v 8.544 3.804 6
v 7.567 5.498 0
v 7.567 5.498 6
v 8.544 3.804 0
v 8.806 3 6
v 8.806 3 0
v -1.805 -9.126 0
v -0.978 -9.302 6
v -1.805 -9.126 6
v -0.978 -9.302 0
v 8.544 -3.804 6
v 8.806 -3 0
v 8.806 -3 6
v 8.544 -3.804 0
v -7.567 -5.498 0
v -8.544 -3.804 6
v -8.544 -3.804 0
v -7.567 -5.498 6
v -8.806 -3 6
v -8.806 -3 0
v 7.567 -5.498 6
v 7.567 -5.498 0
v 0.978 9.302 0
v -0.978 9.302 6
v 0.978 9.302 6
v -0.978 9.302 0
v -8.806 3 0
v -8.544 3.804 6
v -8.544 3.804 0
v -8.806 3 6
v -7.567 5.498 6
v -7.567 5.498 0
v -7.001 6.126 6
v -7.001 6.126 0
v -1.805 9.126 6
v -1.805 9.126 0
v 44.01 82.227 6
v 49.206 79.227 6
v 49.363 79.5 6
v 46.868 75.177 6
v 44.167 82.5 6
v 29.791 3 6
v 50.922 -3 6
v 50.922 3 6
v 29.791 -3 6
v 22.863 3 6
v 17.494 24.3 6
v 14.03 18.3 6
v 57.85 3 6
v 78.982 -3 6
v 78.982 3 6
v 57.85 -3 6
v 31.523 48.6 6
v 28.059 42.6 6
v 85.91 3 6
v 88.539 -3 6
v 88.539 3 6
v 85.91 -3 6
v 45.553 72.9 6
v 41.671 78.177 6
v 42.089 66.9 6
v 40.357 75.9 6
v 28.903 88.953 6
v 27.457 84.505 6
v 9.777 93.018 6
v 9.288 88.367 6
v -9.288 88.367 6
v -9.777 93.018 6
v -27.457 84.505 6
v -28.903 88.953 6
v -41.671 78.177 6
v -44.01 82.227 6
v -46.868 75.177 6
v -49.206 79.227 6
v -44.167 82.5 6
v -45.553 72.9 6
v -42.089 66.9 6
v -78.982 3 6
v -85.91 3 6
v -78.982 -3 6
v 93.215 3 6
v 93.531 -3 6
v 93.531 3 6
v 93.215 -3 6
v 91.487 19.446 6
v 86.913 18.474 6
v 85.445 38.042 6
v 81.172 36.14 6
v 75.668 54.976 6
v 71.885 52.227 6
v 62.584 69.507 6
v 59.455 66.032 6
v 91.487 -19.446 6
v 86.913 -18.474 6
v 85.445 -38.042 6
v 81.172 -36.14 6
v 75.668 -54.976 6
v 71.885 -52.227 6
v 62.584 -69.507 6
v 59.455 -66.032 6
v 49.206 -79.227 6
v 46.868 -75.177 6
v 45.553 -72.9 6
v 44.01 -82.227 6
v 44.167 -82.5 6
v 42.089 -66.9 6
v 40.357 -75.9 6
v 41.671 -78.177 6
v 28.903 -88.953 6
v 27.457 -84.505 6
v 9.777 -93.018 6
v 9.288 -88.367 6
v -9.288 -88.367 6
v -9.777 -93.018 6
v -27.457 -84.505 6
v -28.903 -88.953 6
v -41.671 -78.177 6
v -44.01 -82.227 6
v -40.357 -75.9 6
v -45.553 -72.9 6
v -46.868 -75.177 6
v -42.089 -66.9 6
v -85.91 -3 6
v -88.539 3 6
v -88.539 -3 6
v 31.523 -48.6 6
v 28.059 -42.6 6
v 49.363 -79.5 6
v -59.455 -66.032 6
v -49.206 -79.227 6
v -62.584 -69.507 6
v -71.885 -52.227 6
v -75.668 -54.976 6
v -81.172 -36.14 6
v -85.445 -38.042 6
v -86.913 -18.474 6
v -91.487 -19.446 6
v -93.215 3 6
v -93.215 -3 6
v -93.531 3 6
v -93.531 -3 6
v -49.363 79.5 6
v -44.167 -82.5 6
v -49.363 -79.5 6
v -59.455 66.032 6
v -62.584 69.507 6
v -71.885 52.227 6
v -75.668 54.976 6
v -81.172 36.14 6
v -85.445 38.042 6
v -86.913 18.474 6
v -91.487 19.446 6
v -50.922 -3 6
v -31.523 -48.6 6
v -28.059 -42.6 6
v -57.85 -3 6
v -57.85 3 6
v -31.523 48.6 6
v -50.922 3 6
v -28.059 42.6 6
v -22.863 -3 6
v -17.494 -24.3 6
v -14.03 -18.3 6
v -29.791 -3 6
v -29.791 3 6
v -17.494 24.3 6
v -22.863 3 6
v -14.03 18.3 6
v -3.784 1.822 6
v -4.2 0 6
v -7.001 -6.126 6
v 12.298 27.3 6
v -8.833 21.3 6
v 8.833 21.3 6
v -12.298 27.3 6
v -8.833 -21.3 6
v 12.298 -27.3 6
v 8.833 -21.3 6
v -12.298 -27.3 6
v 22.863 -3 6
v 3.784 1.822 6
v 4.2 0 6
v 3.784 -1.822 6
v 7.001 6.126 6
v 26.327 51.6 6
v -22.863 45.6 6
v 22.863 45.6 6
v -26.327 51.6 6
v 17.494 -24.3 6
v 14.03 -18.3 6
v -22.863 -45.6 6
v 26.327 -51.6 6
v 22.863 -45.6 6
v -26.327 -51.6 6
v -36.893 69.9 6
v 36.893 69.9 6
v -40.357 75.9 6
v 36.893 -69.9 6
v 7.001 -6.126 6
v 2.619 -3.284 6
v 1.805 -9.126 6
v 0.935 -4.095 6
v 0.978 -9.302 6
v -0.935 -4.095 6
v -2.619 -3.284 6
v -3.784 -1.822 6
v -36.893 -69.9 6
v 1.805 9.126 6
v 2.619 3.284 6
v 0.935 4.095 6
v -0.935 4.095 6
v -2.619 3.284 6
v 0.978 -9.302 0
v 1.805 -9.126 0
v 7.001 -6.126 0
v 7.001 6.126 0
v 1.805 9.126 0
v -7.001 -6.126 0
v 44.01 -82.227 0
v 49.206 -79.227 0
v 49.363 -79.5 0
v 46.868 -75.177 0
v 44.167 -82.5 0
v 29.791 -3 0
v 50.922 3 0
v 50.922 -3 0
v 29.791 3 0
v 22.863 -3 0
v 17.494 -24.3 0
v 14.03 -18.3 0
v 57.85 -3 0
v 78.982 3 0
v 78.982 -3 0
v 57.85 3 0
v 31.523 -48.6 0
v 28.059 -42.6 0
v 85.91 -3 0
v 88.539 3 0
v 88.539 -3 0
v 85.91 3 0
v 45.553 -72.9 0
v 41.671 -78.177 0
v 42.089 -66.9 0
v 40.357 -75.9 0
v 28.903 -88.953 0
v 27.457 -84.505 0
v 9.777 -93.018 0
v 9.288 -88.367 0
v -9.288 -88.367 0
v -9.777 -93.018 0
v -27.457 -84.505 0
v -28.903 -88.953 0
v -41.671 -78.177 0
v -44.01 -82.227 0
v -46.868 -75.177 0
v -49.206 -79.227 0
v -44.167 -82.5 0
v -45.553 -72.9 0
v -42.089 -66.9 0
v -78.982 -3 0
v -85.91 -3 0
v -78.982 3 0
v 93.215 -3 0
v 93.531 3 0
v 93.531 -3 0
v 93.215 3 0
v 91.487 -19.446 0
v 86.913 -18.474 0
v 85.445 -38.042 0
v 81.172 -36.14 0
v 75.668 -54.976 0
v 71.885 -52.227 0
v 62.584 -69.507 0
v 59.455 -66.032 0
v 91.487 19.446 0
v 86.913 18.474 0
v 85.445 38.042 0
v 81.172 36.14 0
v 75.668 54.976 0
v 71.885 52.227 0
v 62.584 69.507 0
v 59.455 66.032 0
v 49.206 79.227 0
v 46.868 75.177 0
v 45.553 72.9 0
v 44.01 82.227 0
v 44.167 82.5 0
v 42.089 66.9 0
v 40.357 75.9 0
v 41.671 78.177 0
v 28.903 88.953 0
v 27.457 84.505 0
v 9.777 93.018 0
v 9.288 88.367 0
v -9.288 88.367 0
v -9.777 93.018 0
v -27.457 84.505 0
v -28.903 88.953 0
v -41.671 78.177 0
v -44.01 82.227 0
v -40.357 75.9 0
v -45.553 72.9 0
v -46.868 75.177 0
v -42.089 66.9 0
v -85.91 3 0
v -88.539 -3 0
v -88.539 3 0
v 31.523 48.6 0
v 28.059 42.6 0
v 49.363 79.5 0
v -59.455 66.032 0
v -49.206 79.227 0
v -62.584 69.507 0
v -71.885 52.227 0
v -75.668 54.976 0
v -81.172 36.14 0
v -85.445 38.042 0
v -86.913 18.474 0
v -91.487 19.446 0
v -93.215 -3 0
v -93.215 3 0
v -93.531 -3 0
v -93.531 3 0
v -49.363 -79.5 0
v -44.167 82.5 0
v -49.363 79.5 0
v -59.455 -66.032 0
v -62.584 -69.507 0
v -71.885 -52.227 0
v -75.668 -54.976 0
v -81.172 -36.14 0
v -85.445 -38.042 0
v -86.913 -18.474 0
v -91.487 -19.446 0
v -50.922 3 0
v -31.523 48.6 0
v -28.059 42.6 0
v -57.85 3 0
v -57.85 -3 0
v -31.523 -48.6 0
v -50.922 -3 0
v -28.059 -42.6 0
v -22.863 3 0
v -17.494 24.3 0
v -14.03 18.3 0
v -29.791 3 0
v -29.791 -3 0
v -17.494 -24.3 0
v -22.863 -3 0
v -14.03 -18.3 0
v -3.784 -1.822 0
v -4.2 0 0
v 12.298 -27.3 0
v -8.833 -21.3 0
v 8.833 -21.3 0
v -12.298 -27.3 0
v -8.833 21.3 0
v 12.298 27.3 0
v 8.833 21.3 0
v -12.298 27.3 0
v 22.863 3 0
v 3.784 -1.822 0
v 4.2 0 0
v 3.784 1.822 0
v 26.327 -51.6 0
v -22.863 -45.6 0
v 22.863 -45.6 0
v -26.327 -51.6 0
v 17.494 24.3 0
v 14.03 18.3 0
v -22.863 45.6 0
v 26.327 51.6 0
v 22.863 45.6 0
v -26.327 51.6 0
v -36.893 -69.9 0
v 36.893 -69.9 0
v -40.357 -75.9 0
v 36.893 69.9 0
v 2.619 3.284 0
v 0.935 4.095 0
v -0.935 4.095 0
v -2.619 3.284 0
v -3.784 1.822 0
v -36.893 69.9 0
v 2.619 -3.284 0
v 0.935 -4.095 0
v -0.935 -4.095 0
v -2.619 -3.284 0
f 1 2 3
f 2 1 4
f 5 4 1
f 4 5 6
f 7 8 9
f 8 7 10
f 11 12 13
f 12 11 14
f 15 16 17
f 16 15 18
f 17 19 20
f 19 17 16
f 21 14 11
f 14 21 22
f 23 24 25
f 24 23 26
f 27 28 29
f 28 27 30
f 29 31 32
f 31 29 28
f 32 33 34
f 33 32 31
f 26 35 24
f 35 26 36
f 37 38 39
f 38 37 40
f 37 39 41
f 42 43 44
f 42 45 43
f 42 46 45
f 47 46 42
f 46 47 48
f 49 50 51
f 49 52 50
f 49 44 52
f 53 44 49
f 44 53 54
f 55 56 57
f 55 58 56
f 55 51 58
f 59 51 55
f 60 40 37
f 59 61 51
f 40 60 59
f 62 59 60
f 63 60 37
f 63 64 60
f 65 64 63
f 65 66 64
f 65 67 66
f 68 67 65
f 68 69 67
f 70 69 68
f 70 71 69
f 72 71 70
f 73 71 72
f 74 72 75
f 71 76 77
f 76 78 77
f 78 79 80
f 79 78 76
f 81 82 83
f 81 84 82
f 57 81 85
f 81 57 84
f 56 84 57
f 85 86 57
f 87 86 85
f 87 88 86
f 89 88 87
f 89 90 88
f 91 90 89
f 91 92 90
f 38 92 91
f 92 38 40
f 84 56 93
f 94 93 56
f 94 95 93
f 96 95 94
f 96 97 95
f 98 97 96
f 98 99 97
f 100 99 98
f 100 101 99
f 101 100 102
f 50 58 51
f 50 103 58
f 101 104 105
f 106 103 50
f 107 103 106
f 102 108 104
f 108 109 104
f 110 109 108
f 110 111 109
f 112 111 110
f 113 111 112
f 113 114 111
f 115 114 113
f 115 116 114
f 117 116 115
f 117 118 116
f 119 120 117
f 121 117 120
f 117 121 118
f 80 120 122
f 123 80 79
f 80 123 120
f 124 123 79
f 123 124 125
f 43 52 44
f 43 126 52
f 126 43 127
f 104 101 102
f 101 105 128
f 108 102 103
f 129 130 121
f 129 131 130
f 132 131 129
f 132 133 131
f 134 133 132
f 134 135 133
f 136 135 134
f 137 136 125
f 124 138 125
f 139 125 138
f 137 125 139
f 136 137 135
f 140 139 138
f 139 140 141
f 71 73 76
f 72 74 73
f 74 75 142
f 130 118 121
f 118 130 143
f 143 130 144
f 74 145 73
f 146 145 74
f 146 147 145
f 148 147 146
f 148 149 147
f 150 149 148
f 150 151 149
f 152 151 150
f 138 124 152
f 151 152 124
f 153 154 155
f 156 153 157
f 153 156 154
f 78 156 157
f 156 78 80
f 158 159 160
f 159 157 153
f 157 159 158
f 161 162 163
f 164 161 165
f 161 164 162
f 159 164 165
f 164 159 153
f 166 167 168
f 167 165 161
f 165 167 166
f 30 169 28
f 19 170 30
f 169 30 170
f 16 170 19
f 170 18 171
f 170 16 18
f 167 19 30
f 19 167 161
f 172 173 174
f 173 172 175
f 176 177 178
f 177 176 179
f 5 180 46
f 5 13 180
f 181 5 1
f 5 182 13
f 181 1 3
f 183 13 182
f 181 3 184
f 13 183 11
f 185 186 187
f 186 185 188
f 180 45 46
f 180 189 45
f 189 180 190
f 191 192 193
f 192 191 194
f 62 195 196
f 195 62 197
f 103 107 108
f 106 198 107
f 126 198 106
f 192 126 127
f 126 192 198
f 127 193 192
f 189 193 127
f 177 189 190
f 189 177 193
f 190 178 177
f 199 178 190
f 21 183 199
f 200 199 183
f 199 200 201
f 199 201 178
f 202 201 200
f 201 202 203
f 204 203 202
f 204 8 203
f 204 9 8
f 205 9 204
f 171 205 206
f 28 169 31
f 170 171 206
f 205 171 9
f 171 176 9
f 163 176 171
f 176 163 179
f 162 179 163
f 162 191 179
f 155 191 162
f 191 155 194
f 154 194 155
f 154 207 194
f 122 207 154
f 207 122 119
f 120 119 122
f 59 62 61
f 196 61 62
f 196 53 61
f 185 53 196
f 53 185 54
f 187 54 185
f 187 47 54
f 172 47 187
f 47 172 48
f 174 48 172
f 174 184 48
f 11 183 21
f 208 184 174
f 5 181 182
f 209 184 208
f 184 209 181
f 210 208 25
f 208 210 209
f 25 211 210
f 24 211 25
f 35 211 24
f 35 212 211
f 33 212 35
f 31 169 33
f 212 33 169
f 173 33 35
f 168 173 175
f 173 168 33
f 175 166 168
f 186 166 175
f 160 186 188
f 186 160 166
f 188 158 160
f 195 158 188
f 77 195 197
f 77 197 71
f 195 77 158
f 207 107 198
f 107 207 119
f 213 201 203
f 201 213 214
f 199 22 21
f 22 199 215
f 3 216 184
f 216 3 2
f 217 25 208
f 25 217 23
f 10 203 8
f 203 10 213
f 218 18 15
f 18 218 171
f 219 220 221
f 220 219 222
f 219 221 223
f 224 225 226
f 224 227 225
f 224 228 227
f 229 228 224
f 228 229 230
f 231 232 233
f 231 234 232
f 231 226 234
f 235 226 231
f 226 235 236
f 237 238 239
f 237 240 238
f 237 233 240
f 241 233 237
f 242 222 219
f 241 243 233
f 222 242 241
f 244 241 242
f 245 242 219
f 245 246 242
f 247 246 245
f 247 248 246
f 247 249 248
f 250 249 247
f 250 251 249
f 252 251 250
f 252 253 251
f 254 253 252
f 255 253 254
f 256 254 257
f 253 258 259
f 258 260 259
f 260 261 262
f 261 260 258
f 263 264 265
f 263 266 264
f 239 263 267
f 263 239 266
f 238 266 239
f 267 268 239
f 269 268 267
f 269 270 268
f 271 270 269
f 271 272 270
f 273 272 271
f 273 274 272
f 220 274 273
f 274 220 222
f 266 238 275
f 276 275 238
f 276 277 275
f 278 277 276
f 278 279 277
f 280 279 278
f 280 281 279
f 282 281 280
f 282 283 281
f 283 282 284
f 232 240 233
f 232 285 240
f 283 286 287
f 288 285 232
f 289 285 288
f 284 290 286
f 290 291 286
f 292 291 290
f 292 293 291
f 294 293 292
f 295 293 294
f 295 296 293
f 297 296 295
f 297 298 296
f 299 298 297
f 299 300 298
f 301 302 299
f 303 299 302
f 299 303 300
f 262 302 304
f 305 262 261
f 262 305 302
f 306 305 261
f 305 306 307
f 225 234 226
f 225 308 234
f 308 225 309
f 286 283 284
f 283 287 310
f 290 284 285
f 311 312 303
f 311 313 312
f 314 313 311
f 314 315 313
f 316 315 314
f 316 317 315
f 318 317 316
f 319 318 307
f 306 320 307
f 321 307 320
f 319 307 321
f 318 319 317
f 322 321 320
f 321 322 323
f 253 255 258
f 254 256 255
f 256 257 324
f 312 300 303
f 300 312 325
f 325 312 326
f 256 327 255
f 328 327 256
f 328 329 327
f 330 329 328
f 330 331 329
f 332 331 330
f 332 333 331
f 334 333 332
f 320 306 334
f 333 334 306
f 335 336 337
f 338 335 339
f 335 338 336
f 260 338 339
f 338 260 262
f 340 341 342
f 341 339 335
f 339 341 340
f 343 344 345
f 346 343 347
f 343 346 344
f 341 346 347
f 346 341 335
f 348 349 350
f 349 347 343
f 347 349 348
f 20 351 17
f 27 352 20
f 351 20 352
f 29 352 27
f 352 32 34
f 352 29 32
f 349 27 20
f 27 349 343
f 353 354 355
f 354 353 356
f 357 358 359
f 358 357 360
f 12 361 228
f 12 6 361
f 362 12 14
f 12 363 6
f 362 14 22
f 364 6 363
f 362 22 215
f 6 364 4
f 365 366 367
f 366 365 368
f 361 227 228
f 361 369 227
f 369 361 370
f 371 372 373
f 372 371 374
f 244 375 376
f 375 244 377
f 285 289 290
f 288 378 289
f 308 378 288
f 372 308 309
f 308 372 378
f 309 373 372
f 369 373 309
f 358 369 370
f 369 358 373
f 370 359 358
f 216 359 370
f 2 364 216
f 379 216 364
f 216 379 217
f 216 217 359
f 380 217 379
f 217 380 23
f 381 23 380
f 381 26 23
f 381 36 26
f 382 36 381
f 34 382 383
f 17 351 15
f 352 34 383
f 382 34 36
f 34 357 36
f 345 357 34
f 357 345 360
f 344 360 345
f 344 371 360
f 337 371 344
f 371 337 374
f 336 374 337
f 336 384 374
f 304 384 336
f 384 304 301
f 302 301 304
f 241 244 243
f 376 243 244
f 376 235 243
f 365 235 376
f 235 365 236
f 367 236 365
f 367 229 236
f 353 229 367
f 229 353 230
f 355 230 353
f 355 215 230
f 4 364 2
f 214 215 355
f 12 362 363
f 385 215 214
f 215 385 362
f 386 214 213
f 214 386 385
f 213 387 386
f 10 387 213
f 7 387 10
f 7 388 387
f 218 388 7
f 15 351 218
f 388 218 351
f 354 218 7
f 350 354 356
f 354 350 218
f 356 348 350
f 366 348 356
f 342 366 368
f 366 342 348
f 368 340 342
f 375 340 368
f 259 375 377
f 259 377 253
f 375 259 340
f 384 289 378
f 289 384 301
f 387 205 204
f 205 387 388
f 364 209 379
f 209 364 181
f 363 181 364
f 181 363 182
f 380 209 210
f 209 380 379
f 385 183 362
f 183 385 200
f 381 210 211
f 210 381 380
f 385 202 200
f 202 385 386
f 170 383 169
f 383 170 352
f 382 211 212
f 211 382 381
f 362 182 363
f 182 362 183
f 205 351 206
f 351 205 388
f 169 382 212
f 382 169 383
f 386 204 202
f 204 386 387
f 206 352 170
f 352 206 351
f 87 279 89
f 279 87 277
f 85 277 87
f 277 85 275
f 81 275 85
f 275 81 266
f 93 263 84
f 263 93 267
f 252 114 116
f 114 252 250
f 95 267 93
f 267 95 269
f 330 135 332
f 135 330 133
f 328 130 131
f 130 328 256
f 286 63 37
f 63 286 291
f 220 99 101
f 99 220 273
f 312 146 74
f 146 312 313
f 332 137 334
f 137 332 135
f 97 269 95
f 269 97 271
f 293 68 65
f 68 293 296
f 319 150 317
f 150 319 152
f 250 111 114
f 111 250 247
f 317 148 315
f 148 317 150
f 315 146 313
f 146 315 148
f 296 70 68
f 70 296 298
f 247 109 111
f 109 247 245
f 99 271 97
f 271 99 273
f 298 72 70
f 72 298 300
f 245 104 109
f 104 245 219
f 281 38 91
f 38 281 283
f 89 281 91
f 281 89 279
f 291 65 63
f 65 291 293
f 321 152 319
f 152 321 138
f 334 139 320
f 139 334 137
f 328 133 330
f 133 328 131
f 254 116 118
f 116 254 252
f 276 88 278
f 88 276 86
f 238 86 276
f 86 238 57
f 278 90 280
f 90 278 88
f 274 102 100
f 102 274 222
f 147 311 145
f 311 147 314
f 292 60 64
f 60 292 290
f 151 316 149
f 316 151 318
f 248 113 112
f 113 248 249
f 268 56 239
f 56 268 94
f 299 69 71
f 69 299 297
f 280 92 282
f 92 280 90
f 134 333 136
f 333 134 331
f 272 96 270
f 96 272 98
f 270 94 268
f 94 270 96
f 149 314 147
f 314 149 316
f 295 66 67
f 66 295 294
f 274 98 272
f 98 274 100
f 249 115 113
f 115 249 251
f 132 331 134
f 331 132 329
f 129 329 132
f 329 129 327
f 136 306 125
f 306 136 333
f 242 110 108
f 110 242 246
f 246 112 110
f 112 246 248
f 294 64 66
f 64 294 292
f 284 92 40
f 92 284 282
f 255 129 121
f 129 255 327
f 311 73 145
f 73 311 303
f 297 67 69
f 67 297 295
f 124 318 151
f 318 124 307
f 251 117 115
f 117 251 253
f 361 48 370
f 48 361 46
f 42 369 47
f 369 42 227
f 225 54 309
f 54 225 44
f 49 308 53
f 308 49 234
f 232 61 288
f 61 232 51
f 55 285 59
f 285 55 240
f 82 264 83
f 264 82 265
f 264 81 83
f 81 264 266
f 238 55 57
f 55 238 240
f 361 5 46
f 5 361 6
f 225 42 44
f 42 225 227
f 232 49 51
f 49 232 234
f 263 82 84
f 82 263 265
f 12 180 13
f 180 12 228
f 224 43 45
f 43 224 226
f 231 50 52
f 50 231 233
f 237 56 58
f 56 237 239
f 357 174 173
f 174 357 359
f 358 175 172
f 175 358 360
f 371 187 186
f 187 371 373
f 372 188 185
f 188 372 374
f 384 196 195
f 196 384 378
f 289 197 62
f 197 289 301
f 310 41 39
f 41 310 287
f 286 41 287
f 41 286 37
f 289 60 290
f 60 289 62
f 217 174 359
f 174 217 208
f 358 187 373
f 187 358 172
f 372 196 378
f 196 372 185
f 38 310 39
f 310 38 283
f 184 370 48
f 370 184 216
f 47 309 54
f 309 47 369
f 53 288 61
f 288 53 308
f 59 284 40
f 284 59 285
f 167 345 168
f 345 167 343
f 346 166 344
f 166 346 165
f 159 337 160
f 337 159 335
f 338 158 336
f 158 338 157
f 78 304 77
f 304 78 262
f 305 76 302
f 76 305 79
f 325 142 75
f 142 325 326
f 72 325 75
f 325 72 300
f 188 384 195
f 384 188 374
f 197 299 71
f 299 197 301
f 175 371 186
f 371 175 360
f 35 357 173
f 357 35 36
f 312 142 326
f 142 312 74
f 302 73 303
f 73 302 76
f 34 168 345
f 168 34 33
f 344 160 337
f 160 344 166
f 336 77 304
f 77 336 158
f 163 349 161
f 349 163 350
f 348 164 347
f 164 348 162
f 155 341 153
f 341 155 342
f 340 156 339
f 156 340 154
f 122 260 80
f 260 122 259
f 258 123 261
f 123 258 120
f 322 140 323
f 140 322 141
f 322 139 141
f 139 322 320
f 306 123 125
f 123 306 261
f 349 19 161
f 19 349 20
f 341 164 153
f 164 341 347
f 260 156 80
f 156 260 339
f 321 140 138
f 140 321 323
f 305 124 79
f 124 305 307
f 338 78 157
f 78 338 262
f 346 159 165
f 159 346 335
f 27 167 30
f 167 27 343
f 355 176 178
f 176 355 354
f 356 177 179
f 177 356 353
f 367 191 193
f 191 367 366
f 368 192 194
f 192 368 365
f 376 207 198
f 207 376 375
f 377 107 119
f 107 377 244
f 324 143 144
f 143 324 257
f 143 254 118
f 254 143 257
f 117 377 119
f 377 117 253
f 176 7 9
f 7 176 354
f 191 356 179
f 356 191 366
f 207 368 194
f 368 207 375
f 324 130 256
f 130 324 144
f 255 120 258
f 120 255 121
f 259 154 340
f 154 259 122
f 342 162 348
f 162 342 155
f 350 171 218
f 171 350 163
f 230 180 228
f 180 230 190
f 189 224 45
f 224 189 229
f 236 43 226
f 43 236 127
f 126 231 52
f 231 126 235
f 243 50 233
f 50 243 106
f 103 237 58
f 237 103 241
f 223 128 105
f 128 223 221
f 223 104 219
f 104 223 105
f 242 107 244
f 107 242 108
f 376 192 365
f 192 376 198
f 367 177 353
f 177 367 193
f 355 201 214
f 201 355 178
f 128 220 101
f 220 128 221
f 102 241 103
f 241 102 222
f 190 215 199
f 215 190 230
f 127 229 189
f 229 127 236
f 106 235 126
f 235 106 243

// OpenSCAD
// file: carousel-commons.scad
module square_prism(size, p0, p1) {
    dir = p1 - p0;
    h = norm(dir);
    if (dir[0] == 0 && dir[1] == 0) {
        // no transformation necessary
        translate(p0)
        translate([0, 0, h/2])
        cube([size, size, h], center = true);
    }
    else {
        w  = dir / h;
        u0 = cross(w, [0,0,1]);
        u  = u0 / norm(u0);
        v0 = cross(w, u);
        v  = v0 / norm(v0);
        multmatrix(m=[[u[0], v[0], w[0], p0.x],
                      [u[1], v[1], w[1], p0.y],
                      [u[2], v[2], w[2], p0.z],
                      [0,    0,    0,    1]])
        translate([0, 0, h/2])
        cube([size, size, h], center = true);
    }
}

module point_plate(thickness, points) {
    hull() {
        for (i = [0 : len(points)-1]){
            translate(points[i])
            sphere(d = thickness);
        }
    }
}
// file: carousel-config.scad
// ----------------------------------------------------------------------------
// Configuration of the carousel and its components.
//
// All the values beyod "---- derived" string in each of the sections should
// not be modified manually, as they are derived from the previously defined
// parameters in some way...
// ----------------------------------------------------------------------------

// Generic parameters to address consistency & interconnections of parts.
CYL_FN = 32; // BEWARE!!! set to +- 256 for STL export!
BLEED = 0.5; // overlap for union & difference operations
EASE = 0.2; // socket/pin ease for interconnecting of parts & holes

// Core defining shape of our carousel is N-faced cylinder.
// This affects most of the subsequent parameter definitions & usage.
CAROUSEL_FACE_COUNT = 6;
CAROUSEL_ESCRIBED_RADIUS = 120;
// ---- derived
CAROUSEL_INSCRIBED_RADIUS = CAROUSEL_ESCRIBED_RADIUS * cos(180/CAROUSEL_FACE_COUNT);

// Base of the carousel -> stand that holds the axle, walls, etc.
BASE_TOTAL_HEIGHT = 24;
BASE_FLOOR_THICKNESS = 4;
BASE_WALL_THICKNESS = 4;

// Face, or, a wall of the carousel "shell".
FACE_HEIGHT = 150;
FACE_THICKNESS = 5;
// ---- derived
FACE_WIDTH = CAROUSEL_ESCRIBED_RADIUS * 2 * sin(180/CAROUSEL_FACE_COUNT);
FACE_ANGLE = (1 - 2/CAROUSEL_FACE_COUNT)*180;
FACE_APOTHEM_LEN = FACE_WIDTH / (2 * tan(180/CAROUSEL_FACE_COUNT));
FACE_DOOR_HEIGHT = 0.66 * FACE_HEIGHT;
FACE_DOOR_WIDTH = 0.75 * FACE_WIDTH;

// Roof of the carousel.
ROOF_THICKNESS = 2;
ROOF_HEIGHT = 1.3 * FACE_HEIGHT;

// Ball bearing - real-life dimensions of ball bearing used to "power" the axle.
BEARING_OUTER_D = 22;
BEARING_INNER_D = 8;
BEARING_HEIGHT = 7;
BEARING_SHELL_THICKNESS = 2;

// Axle rotating inside carousel.
AXLE_RADIUS = 4;

// Rotating rig carrying the seats.
RIG_HEIGHT = 6;
RIG_STR = 6;

// Abstract "rings" carrying seats, and their distance off the carousel center
// as a fraction of radius.
RIG_RING_POSITIONS = [0.3, 0.6, 0.9];
RIG_MAX_R = 0.90 * CAROUSEL_INSCRIBED_RADIUS;
// main file
include <carousel-config.scad>;
use <carousel-commons.scad>;

// Top rotating part used to attach the carousel seats.
module carousel_rig() {
    inner_sin = sin(360/CAROUSEL_FACE_COUNT/2);

    color("SaddleBrown") {
        // core ring
        difference() {
            cylinder(h = RIG_HEIGHT, r = 0.1 * RIG_MAX_R);
            translate([0, 0, -0.5 * BLEED])
            cylinder(h = RIG_HEIGHT + BLEED, r = AXLE_RADIUS + EASE);
        }
        // outer ring
        difference() {
            cylinder(h = RIG_HEIGHT, r = RIG_MAX_R);
            translate([0, 0, -0.5 * BLEED])
            cylinder(h = RIG_HEIGHT + BLEED, r = 0.95 * RIG_MAX_R);
        }
        // iterate each face/wall spot
        dz = 0.5 * RIG_STR;
        for (i = [0 : CAROUSEL_FACE_COUNT]){
            rotate(i * 360/CAROUSEL_FACE_COUNT, [0, 0, 1]) {
                // star-beam
                square_prism(RIG_STR, [0.05 * RIG_MAX_R, 0, dz], [RIG_MAX_R, 0, dz]);
                // cross-beams
                for (frac = RIG_RING_POSITIONS) {
                    ring_r = frac * RIG_MAX_R;
                    translate([ring_r, 0, 0])
                    rotate([0, 0, 180 - FACE_ANGLE/2])
                    square_prism(RIG_STR, [0, 0, dz], [2 * ring_r * inner_sin, 0, dz]);
                }
            }
        }
    }
}

carousel_rig();
